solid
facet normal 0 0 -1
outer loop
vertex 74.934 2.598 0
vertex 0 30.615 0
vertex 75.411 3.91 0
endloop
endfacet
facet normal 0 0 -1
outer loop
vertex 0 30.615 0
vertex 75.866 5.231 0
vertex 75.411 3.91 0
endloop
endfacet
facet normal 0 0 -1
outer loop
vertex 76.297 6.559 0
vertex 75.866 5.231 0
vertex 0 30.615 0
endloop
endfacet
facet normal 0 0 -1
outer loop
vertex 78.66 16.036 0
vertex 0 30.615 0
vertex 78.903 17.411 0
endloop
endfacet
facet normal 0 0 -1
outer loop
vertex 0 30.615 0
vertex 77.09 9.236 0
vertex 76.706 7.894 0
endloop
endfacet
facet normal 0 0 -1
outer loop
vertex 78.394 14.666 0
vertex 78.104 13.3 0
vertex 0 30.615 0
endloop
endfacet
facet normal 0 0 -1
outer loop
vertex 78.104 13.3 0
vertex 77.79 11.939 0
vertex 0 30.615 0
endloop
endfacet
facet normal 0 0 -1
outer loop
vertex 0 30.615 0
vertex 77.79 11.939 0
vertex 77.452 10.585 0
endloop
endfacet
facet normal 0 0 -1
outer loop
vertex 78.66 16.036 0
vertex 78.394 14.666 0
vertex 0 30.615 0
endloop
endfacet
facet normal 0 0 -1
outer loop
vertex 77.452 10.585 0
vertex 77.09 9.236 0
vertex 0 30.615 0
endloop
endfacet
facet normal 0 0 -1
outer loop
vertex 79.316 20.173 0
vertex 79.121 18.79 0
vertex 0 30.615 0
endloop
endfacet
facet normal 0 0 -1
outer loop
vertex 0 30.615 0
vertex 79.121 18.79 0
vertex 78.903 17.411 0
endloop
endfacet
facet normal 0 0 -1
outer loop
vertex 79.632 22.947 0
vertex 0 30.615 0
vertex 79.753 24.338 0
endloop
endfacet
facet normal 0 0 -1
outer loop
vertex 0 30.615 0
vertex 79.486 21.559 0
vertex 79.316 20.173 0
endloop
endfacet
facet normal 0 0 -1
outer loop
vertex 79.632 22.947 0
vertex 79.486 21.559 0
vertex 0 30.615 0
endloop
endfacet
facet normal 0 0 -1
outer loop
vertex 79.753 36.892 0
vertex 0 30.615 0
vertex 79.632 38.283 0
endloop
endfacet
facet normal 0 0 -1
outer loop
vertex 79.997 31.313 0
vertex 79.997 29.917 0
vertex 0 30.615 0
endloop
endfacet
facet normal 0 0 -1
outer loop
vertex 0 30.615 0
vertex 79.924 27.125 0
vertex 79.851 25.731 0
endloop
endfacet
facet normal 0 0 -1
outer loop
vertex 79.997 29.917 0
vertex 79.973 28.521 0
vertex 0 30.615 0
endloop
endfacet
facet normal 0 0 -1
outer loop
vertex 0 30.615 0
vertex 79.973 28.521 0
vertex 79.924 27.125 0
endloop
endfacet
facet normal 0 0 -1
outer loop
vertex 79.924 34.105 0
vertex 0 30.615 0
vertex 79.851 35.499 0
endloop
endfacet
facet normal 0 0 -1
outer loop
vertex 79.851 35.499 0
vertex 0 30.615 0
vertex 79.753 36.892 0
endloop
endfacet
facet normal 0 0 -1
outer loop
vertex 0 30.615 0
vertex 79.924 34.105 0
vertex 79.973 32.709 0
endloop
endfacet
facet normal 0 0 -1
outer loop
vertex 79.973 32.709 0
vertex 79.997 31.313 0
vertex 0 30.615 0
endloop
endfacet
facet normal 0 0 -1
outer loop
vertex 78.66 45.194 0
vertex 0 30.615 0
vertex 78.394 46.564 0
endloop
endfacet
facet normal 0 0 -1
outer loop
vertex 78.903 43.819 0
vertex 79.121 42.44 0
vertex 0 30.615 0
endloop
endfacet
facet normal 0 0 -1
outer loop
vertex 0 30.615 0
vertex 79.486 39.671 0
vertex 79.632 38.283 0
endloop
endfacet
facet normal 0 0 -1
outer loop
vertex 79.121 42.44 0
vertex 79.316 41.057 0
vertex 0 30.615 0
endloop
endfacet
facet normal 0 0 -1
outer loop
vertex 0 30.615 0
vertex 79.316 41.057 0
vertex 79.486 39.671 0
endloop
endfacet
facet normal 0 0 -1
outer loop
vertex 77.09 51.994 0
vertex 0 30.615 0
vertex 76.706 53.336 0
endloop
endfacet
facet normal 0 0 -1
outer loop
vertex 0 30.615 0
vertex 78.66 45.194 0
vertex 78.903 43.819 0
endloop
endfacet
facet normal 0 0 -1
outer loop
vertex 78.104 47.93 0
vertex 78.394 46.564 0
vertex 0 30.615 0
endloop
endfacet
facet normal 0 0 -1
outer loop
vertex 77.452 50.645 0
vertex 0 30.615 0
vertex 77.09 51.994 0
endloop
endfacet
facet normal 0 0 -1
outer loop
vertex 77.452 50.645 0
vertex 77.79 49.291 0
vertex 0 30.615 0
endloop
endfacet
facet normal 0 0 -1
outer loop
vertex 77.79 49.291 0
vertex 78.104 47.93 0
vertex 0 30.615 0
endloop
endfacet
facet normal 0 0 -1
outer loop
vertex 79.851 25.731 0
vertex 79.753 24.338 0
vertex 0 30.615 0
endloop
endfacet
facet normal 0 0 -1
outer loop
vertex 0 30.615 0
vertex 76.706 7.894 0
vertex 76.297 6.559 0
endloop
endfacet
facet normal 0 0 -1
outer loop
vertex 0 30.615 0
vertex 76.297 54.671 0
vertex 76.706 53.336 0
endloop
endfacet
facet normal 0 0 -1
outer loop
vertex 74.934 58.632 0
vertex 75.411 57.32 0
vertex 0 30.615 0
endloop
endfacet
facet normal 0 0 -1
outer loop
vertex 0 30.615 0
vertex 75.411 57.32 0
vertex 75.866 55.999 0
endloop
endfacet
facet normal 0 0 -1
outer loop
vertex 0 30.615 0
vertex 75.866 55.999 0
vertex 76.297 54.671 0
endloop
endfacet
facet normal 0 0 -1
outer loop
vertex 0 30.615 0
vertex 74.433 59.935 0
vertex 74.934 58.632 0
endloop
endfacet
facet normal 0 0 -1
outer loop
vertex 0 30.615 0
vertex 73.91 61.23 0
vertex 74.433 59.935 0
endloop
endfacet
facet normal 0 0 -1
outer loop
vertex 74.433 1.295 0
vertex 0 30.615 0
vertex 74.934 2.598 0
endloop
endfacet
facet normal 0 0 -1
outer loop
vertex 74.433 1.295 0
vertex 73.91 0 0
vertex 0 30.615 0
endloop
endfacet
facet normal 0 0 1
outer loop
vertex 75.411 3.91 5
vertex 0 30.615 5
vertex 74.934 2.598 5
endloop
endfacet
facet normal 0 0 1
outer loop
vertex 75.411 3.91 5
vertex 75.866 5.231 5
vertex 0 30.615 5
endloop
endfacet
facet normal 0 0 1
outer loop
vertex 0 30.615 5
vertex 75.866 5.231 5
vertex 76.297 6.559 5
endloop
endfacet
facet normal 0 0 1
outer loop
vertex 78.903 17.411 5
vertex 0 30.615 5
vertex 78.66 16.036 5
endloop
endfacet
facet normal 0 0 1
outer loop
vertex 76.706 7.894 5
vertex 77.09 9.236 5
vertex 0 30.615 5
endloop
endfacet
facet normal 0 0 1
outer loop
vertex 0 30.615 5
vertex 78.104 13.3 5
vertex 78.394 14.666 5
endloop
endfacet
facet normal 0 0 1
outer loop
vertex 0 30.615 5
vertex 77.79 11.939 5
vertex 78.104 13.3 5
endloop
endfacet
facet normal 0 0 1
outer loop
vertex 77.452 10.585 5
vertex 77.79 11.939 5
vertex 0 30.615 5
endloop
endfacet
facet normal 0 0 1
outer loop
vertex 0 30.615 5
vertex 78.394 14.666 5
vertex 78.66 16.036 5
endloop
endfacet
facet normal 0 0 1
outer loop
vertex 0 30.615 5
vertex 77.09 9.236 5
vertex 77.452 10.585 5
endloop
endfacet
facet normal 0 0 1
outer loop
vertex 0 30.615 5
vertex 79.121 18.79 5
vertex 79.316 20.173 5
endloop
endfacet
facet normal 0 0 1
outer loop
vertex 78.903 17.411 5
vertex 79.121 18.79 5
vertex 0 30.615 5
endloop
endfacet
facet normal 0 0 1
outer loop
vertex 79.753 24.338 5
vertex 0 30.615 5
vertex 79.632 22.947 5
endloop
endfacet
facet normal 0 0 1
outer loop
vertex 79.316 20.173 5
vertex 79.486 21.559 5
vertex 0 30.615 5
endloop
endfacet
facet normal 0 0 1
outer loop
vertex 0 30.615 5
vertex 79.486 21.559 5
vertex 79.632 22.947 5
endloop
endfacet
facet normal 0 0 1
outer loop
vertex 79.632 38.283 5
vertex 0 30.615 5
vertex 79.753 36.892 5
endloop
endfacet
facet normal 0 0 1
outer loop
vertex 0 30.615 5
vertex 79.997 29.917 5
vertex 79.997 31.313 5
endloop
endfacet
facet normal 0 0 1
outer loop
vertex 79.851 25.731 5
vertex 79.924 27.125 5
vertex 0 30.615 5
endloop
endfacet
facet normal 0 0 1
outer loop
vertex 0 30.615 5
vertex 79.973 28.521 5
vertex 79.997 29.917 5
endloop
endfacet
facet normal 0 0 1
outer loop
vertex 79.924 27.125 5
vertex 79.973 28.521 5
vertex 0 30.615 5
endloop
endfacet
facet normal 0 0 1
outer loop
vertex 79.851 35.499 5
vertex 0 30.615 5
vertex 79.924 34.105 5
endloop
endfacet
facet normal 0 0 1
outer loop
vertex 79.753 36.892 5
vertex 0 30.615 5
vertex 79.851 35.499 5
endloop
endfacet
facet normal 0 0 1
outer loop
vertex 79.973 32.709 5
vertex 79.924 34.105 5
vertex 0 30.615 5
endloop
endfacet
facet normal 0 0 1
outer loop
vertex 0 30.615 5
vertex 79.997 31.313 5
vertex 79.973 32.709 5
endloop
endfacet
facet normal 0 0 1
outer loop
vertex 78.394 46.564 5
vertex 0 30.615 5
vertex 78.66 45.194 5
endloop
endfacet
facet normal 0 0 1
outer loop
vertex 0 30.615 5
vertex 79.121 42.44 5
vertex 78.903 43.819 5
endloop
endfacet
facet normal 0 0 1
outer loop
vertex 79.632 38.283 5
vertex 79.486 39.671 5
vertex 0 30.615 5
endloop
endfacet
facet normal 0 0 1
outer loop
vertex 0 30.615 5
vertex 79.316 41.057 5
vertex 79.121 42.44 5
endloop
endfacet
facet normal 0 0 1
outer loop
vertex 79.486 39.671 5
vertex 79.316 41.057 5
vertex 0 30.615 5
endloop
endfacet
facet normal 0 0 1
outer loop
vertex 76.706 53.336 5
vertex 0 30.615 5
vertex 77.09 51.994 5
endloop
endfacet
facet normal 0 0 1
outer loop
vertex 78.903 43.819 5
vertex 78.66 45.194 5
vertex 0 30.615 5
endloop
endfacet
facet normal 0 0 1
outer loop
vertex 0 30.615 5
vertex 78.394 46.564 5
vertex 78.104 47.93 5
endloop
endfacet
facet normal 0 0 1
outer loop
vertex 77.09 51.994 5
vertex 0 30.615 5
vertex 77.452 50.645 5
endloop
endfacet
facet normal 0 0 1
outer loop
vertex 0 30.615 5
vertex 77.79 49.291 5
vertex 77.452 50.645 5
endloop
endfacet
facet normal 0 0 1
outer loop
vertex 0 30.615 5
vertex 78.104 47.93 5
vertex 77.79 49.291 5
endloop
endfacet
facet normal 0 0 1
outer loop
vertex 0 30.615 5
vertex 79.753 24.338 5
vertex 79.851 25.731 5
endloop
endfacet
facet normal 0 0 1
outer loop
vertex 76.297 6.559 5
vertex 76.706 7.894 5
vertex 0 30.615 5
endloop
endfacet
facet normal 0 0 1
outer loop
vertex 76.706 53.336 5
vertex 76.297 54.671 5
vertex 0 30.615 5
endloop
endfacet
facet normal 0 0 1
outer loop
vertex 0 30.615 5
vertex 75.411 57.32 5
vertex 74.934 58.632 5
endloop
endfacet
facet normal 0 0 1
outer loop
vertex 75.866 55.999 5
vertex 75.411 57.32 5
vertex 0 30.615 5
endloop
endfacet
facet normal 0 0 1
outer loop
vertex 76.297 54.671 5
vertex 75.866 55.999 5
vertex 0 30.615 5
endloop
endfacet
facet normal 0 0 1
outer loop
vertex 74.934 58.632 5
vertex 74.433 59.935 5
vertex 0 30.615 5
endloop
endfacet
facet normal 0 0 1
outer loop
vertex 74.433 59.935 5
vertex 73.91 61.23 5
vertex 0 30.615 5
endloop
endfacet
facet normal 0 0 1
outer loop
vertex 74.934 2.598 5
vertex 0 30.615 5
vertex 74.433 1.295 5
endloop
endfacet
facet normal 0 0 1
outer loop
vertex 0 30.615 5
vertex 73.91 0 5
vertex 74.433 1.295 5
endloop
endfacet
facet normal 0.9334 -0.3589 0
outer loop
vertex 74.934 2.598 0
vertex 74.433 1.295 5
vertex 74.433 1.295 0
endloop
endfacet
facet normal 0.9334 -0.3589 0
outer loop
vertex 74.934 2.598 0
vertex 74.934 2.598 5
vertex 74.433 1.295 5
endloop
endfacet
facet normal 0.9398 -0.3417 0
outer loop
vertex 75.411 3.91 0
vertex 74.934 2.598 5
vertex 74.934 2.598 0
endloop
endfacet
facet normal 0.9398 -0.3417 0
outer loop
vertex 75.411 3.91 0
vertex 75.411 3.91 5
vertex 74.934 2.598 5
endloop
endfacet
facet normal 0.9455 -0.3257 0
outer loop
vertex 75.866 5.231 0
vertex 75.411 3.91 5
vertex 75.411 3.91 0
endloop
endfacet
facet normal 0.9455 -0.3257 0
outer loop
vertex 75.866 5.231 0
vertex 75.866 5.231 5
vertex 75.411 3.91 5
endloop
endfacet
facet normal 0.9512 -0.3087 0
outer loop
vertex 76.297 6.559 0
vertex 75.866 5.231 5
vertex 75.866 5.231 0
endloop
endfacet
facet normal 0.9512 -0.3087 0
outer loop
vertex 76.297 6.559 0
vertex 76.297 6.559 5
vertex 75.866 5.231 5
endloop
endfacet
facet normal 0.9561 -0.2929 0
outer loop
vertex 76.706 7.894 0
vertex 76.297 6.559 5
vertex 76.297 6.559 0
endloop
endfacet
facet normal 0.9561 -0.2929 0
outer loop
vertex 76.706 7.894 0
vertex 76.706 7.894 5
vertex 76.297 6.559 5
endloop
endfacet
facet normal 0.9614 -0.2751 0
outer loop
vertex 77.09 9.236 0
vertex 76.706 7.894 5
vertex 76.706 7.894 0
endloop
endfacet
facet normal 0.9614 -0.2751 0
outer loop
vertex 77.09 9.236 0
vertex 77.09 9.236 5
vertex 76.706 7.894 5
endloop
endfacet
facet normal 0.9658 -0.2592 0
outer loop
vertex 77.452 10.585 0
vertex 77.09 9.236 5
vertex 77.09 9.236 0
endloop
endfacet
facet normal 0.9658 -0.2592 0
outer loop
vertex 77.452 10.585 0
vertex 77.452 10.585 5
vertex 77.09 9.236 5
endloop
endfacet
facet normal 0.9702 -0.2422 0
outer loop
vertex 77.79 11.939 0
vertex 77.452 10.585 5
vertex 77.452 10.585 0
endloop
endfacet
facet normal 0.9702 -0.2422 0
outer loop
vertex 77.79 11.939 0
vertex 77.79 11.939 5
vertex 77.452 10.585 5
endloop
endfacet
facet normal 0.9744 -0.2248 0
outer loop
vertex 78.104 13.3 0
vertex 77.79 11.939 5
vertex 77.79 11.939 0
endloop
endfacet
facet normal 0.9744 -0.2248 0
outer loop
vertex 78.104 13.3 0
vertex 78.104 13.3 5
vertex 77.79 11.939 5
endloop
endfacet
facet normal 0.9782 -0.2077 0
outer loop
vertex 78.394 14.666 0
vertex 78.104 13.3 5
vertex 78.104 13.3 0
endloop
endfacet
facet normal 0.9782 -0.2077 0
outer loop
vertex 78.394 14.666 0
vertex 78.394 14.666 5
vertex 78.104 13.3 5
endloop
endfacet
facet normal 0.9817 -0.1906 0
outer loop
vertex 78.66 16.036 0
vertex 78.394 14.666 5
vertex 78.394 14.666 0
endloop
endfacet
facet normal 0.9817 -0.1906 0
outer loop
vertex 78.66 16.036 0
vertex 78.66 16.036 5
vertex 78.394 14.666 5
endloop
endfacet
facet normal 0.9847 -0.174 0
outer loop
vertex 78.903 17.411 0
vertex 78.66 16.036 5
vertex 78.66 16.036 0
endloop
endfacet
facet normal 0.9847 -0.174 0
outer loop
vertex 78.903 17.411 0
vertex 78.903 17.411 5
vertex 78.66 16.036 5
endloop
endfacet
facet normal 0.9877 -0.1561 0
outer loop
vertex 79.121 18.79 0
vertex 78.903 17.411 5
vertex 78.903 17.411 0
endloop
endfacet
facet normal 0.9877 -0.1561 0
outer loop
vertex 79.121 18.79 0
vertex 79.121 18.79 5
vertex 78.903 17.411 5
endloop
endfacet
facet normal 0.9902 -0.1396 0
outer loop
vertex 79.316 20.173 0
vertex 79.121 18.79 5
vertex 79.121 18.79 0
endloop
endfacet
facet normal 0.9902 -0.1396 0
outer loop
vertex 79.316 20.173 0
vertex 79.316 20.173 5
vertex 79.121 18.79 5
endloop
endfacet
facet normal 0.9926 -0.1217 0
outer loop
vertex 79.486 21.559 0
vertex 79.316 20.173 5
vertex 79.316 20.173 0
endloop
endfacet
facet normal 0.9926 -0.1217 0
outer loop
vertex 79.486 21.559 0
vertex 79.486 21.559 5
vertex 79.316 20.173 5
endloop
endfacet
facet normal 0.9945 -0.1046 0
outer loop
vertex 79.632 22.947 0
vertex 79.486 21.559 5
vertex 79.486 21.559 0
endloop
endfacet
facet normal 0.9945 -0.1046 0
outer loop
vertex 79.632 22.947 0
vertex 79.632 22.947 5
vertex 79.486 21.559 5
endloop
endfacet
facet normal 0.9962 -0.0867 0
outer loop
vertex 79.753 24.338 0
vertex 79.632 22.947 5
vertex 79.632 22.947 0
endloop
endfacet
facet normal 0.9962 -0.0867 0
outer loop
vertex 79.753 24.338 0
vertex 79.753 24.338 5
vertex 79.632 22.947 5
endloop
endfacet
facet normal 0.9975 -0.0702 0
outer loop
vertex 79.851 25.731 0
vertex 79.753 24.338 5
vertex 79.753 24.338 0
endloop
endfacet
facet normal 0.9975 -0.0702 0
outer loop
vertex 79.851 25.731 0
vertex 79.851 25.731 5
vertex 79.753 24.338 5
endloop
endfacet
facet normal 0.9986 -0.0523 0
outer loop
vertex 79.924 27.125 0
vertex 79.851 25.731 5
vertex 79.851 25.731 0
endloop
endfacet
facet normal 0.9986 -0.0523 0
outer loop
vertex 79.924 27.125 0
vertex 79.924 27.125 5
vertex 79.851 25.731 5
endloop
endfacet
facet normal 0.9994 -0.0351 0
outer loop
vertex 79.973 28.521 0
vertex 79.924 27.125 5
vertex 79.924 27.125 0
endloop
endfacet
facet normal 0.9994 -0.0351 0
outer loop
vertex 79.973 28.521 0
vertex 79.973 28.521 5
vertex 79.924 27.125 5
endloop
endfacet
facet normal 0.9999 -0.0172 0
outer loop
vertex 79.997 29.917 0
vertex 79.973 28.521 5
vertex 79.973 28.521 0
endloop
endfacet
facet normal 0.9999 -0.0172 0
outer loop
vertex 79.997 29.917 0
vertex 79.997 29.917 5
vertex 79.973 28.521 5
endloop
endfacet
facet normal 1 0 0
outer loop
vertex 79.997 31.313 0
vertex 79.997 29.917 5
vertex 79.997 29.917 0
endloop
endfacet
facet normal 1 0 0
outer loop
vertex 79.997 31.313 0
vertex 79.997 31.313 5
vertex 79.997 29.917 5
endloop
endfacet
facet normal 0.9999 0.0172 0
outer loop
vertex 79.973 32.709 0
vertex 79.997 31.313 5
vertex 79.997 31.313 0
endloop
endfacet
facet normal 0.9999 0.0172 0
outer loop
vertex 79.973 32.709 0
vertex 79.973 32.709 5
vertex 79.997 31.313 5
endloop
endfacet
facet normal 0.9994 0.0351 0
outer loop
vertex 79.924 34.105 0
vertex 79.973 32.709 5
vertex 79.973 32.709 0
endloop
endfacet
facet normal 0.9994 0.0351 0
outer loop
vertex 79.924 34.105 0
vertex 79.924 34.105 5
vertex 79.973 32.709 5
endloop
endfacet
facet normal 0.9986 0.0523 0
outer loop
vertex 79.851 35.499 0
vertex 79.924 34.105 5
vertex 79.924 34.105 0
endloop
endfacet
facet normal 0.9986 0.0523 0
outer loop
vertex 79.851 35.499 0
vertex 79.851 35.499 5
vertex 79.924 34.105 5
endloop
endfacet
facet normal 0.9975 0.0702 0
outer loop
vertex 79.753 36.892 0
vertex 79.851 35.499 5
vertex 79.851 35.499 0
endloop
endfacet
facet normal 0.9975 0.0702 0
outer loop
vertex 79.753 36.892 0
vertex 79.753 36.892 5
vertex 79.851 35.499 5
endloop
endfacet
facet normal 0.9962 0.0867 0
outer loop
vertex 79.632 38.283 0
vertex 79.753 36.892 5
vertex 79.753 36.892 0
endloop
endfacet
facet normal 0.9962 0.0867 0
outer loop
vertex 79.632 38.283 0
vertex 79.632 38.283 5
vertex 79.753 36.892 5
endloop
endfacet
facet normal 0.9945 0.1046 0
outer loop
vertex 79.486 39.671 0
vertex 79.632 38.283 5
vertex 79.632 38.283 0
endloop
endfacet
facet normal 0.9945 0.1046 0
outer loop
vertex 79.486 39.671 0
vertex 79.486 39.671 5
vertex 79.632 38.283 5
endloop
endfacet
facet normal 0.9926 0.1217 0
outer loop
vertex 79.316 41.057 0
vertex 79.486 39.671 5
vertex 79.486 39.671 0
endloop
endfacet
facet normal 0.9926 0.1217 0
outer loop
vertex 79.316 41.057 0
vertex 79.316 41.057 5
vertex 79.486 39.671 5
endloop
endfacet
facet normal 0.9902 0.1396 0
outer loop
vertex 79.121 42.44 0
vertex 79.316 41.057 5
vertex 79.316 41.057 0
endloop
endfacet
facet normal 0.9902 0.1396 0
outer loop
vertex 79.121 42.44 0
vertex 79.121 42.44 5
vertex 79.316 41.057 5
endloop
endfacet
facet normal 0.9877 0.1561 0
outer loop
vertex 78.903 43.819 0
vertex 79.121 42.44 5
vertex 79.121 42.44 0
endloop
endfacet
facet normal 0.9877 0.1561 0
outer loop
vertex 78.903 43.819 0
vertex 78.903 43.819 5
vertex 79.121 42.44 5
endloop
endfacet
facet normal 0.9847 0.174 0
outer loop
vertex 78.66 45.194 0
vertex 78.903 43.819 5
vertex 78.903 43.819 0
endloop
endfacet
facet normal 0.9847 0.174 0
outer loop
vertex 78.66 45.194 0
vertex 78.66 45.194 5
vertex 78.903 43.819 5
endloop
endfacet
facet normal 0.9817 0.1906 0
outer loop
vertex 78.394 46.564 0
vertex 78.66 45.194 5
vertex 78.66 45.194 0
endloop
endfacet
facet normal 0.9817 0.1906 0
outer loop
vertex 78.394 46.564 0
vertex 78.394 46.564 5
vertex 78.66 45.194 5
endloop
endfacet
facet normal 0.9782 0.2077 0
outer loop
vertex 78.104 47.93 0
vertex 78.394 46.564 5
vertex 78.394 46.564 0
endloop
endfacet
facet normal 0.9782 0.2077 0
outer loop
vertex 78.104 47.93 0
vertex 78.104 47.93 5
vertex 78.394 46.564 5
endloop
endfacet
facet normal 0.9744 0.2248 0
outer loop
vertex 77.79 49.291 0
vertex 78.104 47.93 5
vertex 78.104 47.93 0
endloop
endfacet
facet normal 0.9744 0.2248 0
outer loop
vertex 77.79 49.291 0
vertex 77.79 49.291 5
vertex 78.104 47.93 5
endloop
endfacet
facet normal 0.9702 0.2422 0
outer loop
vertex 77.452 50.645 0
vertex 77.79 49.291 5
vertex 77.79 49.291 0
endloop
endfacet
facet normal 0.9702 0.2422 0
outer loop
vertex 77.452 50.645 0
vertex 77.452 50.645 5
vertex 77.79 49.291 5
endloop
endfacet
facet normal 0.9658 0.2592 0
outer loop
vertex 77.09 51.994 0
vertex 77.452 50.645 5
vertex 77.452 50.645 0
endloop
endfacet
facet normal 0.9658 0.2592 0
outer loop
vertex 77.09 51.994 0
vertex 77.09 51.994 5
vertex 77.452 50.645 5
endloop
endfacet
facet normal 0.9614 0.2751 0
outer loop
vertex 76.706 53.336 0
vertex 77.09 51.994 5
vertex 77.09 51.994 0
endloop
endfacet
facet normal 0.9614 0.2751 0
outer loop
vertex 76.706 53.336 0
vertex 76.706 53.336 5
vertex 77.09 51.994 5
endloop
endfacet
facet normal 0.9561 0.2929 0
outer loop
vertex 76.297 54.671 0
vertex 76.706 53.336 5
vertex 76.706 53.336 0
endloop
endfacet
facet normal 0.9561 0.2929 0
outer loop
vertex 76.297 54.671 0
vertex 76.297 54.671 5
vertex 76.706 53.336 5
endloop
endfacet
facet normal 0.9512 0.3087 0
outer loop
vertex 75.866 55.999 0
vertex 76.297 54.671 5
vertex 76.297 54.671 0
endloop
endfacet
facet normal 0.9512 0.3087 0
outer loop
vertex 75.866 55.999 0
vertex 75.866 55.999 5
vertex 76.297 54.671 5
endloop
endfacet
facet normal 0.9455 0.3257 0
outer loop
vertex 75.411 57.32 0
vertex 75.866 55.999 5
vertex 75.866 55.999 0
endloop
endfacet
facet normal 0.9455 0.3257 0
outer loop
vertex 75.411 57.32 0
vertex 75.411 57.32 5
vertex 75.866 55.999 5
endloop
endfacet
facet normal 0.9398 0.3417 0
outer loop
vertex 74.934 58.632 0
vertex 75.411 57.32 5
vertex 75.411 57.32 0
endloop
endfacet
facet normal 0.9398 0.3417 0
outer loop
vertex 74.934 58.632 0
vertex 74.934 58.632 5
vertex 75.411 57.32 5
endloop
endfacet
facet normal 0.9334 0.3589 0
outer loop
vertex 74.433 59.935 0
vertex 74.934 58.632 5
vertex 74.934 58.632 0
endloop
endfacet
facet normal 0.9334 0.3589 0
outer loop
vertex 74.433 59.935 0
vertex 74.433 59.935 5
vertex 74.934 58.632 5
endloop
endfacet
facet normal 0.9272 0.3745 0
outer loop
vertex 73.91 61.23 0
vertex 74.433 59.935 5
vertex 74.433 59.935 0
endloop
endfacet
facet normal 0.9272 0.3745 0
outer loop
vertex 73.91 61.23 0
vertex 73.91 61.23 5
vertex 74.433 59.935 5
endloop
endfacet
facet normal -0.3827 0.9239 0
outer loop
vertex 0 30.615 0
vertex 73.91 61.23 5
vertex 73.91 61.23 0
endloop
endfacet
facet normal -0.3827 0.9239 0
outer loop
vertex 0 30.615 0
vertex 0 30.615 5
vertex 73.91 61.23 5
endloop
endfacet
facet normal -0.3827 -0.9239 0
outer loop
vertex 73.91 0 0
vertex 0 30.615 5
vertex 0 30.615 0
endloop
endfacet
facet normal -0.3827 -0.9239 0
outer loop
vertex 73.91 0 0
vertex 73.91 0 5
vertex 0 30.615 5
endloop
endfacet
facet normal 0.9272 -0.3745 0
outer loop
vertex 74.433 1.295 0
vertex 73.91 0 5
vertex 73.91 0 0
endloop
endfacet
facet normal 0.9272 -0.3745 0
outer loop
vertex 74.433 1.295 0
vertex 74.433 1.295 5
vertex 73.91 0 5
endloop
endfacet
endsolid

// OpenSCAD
$fn = 32;

// ----------------------------------------------------------------------
// Arc profile plate: sector, 47 points
// ----------------------------------------------------------------------

// --- parameters (mm) ---
sector_angle = 45;        // sector angle, degrees
sector_r = 80;            // outer radius
arc_step = 1;             // sampling step of the arc, degrees
plate_t = 5;              // plate thickness, Z
fit_tol = 0.02;           // declared fit tolerance (prompt contract)
free_tol = 0.2;           // declared free tolerance (prompt contract)

bbox_x = 2 * sector_r * sin(sector_angle / 2);  // chord of the sector
bbox_y = sector_r;  // depth of the sector (apex to arc)

profile = [[73.91, 0], [74.433, 1.295], [74.934, 2.598], [75.411, 3.91], [75.866, 5.231], [76.297, 6.559], [76.706, 7.894], [77.09, 9.236], [77.452, 10.585], [77.79, 11.939], [78.104, 13.3], [78.394, 14.666], [78.66, 16.036], [78.903, 17.411], [79.121, 18.79], [79.316, 20.173], [79.486, 21.559], [79.632, 22.947], [79.753, 24.338], [79.851, 25.731], [79.924, 27.125], [79.973, 28.521], [79.997, 29.917], [79.997, 31.313], [79.973, 32.709], [79.924, 34.105], [79.851, 35.499], [79.753, 36.892], [79.632, 38.283], [79.486, 39.671], [79.316, 41.057], [79.121, 42.44], [78.903, 43.819], [78.66, 45.194], [78.394, 46.564], [78.104, 47.93], [77.79, 49.291], [77.452, 50.645], [77.09, 51.994], [76.706, 53.336], [76.297, 54.671], [75.866, 55.999], [75.411, 57.32], [74.934, 58.632], [74.433, 59.935], [73.91, 61.23], [0, 30.615]];  // primary outline, 47 points, counter clockwise

// --- the one profile operation ---
linear_extrude(height = plate_t) polygon(points = profile);
